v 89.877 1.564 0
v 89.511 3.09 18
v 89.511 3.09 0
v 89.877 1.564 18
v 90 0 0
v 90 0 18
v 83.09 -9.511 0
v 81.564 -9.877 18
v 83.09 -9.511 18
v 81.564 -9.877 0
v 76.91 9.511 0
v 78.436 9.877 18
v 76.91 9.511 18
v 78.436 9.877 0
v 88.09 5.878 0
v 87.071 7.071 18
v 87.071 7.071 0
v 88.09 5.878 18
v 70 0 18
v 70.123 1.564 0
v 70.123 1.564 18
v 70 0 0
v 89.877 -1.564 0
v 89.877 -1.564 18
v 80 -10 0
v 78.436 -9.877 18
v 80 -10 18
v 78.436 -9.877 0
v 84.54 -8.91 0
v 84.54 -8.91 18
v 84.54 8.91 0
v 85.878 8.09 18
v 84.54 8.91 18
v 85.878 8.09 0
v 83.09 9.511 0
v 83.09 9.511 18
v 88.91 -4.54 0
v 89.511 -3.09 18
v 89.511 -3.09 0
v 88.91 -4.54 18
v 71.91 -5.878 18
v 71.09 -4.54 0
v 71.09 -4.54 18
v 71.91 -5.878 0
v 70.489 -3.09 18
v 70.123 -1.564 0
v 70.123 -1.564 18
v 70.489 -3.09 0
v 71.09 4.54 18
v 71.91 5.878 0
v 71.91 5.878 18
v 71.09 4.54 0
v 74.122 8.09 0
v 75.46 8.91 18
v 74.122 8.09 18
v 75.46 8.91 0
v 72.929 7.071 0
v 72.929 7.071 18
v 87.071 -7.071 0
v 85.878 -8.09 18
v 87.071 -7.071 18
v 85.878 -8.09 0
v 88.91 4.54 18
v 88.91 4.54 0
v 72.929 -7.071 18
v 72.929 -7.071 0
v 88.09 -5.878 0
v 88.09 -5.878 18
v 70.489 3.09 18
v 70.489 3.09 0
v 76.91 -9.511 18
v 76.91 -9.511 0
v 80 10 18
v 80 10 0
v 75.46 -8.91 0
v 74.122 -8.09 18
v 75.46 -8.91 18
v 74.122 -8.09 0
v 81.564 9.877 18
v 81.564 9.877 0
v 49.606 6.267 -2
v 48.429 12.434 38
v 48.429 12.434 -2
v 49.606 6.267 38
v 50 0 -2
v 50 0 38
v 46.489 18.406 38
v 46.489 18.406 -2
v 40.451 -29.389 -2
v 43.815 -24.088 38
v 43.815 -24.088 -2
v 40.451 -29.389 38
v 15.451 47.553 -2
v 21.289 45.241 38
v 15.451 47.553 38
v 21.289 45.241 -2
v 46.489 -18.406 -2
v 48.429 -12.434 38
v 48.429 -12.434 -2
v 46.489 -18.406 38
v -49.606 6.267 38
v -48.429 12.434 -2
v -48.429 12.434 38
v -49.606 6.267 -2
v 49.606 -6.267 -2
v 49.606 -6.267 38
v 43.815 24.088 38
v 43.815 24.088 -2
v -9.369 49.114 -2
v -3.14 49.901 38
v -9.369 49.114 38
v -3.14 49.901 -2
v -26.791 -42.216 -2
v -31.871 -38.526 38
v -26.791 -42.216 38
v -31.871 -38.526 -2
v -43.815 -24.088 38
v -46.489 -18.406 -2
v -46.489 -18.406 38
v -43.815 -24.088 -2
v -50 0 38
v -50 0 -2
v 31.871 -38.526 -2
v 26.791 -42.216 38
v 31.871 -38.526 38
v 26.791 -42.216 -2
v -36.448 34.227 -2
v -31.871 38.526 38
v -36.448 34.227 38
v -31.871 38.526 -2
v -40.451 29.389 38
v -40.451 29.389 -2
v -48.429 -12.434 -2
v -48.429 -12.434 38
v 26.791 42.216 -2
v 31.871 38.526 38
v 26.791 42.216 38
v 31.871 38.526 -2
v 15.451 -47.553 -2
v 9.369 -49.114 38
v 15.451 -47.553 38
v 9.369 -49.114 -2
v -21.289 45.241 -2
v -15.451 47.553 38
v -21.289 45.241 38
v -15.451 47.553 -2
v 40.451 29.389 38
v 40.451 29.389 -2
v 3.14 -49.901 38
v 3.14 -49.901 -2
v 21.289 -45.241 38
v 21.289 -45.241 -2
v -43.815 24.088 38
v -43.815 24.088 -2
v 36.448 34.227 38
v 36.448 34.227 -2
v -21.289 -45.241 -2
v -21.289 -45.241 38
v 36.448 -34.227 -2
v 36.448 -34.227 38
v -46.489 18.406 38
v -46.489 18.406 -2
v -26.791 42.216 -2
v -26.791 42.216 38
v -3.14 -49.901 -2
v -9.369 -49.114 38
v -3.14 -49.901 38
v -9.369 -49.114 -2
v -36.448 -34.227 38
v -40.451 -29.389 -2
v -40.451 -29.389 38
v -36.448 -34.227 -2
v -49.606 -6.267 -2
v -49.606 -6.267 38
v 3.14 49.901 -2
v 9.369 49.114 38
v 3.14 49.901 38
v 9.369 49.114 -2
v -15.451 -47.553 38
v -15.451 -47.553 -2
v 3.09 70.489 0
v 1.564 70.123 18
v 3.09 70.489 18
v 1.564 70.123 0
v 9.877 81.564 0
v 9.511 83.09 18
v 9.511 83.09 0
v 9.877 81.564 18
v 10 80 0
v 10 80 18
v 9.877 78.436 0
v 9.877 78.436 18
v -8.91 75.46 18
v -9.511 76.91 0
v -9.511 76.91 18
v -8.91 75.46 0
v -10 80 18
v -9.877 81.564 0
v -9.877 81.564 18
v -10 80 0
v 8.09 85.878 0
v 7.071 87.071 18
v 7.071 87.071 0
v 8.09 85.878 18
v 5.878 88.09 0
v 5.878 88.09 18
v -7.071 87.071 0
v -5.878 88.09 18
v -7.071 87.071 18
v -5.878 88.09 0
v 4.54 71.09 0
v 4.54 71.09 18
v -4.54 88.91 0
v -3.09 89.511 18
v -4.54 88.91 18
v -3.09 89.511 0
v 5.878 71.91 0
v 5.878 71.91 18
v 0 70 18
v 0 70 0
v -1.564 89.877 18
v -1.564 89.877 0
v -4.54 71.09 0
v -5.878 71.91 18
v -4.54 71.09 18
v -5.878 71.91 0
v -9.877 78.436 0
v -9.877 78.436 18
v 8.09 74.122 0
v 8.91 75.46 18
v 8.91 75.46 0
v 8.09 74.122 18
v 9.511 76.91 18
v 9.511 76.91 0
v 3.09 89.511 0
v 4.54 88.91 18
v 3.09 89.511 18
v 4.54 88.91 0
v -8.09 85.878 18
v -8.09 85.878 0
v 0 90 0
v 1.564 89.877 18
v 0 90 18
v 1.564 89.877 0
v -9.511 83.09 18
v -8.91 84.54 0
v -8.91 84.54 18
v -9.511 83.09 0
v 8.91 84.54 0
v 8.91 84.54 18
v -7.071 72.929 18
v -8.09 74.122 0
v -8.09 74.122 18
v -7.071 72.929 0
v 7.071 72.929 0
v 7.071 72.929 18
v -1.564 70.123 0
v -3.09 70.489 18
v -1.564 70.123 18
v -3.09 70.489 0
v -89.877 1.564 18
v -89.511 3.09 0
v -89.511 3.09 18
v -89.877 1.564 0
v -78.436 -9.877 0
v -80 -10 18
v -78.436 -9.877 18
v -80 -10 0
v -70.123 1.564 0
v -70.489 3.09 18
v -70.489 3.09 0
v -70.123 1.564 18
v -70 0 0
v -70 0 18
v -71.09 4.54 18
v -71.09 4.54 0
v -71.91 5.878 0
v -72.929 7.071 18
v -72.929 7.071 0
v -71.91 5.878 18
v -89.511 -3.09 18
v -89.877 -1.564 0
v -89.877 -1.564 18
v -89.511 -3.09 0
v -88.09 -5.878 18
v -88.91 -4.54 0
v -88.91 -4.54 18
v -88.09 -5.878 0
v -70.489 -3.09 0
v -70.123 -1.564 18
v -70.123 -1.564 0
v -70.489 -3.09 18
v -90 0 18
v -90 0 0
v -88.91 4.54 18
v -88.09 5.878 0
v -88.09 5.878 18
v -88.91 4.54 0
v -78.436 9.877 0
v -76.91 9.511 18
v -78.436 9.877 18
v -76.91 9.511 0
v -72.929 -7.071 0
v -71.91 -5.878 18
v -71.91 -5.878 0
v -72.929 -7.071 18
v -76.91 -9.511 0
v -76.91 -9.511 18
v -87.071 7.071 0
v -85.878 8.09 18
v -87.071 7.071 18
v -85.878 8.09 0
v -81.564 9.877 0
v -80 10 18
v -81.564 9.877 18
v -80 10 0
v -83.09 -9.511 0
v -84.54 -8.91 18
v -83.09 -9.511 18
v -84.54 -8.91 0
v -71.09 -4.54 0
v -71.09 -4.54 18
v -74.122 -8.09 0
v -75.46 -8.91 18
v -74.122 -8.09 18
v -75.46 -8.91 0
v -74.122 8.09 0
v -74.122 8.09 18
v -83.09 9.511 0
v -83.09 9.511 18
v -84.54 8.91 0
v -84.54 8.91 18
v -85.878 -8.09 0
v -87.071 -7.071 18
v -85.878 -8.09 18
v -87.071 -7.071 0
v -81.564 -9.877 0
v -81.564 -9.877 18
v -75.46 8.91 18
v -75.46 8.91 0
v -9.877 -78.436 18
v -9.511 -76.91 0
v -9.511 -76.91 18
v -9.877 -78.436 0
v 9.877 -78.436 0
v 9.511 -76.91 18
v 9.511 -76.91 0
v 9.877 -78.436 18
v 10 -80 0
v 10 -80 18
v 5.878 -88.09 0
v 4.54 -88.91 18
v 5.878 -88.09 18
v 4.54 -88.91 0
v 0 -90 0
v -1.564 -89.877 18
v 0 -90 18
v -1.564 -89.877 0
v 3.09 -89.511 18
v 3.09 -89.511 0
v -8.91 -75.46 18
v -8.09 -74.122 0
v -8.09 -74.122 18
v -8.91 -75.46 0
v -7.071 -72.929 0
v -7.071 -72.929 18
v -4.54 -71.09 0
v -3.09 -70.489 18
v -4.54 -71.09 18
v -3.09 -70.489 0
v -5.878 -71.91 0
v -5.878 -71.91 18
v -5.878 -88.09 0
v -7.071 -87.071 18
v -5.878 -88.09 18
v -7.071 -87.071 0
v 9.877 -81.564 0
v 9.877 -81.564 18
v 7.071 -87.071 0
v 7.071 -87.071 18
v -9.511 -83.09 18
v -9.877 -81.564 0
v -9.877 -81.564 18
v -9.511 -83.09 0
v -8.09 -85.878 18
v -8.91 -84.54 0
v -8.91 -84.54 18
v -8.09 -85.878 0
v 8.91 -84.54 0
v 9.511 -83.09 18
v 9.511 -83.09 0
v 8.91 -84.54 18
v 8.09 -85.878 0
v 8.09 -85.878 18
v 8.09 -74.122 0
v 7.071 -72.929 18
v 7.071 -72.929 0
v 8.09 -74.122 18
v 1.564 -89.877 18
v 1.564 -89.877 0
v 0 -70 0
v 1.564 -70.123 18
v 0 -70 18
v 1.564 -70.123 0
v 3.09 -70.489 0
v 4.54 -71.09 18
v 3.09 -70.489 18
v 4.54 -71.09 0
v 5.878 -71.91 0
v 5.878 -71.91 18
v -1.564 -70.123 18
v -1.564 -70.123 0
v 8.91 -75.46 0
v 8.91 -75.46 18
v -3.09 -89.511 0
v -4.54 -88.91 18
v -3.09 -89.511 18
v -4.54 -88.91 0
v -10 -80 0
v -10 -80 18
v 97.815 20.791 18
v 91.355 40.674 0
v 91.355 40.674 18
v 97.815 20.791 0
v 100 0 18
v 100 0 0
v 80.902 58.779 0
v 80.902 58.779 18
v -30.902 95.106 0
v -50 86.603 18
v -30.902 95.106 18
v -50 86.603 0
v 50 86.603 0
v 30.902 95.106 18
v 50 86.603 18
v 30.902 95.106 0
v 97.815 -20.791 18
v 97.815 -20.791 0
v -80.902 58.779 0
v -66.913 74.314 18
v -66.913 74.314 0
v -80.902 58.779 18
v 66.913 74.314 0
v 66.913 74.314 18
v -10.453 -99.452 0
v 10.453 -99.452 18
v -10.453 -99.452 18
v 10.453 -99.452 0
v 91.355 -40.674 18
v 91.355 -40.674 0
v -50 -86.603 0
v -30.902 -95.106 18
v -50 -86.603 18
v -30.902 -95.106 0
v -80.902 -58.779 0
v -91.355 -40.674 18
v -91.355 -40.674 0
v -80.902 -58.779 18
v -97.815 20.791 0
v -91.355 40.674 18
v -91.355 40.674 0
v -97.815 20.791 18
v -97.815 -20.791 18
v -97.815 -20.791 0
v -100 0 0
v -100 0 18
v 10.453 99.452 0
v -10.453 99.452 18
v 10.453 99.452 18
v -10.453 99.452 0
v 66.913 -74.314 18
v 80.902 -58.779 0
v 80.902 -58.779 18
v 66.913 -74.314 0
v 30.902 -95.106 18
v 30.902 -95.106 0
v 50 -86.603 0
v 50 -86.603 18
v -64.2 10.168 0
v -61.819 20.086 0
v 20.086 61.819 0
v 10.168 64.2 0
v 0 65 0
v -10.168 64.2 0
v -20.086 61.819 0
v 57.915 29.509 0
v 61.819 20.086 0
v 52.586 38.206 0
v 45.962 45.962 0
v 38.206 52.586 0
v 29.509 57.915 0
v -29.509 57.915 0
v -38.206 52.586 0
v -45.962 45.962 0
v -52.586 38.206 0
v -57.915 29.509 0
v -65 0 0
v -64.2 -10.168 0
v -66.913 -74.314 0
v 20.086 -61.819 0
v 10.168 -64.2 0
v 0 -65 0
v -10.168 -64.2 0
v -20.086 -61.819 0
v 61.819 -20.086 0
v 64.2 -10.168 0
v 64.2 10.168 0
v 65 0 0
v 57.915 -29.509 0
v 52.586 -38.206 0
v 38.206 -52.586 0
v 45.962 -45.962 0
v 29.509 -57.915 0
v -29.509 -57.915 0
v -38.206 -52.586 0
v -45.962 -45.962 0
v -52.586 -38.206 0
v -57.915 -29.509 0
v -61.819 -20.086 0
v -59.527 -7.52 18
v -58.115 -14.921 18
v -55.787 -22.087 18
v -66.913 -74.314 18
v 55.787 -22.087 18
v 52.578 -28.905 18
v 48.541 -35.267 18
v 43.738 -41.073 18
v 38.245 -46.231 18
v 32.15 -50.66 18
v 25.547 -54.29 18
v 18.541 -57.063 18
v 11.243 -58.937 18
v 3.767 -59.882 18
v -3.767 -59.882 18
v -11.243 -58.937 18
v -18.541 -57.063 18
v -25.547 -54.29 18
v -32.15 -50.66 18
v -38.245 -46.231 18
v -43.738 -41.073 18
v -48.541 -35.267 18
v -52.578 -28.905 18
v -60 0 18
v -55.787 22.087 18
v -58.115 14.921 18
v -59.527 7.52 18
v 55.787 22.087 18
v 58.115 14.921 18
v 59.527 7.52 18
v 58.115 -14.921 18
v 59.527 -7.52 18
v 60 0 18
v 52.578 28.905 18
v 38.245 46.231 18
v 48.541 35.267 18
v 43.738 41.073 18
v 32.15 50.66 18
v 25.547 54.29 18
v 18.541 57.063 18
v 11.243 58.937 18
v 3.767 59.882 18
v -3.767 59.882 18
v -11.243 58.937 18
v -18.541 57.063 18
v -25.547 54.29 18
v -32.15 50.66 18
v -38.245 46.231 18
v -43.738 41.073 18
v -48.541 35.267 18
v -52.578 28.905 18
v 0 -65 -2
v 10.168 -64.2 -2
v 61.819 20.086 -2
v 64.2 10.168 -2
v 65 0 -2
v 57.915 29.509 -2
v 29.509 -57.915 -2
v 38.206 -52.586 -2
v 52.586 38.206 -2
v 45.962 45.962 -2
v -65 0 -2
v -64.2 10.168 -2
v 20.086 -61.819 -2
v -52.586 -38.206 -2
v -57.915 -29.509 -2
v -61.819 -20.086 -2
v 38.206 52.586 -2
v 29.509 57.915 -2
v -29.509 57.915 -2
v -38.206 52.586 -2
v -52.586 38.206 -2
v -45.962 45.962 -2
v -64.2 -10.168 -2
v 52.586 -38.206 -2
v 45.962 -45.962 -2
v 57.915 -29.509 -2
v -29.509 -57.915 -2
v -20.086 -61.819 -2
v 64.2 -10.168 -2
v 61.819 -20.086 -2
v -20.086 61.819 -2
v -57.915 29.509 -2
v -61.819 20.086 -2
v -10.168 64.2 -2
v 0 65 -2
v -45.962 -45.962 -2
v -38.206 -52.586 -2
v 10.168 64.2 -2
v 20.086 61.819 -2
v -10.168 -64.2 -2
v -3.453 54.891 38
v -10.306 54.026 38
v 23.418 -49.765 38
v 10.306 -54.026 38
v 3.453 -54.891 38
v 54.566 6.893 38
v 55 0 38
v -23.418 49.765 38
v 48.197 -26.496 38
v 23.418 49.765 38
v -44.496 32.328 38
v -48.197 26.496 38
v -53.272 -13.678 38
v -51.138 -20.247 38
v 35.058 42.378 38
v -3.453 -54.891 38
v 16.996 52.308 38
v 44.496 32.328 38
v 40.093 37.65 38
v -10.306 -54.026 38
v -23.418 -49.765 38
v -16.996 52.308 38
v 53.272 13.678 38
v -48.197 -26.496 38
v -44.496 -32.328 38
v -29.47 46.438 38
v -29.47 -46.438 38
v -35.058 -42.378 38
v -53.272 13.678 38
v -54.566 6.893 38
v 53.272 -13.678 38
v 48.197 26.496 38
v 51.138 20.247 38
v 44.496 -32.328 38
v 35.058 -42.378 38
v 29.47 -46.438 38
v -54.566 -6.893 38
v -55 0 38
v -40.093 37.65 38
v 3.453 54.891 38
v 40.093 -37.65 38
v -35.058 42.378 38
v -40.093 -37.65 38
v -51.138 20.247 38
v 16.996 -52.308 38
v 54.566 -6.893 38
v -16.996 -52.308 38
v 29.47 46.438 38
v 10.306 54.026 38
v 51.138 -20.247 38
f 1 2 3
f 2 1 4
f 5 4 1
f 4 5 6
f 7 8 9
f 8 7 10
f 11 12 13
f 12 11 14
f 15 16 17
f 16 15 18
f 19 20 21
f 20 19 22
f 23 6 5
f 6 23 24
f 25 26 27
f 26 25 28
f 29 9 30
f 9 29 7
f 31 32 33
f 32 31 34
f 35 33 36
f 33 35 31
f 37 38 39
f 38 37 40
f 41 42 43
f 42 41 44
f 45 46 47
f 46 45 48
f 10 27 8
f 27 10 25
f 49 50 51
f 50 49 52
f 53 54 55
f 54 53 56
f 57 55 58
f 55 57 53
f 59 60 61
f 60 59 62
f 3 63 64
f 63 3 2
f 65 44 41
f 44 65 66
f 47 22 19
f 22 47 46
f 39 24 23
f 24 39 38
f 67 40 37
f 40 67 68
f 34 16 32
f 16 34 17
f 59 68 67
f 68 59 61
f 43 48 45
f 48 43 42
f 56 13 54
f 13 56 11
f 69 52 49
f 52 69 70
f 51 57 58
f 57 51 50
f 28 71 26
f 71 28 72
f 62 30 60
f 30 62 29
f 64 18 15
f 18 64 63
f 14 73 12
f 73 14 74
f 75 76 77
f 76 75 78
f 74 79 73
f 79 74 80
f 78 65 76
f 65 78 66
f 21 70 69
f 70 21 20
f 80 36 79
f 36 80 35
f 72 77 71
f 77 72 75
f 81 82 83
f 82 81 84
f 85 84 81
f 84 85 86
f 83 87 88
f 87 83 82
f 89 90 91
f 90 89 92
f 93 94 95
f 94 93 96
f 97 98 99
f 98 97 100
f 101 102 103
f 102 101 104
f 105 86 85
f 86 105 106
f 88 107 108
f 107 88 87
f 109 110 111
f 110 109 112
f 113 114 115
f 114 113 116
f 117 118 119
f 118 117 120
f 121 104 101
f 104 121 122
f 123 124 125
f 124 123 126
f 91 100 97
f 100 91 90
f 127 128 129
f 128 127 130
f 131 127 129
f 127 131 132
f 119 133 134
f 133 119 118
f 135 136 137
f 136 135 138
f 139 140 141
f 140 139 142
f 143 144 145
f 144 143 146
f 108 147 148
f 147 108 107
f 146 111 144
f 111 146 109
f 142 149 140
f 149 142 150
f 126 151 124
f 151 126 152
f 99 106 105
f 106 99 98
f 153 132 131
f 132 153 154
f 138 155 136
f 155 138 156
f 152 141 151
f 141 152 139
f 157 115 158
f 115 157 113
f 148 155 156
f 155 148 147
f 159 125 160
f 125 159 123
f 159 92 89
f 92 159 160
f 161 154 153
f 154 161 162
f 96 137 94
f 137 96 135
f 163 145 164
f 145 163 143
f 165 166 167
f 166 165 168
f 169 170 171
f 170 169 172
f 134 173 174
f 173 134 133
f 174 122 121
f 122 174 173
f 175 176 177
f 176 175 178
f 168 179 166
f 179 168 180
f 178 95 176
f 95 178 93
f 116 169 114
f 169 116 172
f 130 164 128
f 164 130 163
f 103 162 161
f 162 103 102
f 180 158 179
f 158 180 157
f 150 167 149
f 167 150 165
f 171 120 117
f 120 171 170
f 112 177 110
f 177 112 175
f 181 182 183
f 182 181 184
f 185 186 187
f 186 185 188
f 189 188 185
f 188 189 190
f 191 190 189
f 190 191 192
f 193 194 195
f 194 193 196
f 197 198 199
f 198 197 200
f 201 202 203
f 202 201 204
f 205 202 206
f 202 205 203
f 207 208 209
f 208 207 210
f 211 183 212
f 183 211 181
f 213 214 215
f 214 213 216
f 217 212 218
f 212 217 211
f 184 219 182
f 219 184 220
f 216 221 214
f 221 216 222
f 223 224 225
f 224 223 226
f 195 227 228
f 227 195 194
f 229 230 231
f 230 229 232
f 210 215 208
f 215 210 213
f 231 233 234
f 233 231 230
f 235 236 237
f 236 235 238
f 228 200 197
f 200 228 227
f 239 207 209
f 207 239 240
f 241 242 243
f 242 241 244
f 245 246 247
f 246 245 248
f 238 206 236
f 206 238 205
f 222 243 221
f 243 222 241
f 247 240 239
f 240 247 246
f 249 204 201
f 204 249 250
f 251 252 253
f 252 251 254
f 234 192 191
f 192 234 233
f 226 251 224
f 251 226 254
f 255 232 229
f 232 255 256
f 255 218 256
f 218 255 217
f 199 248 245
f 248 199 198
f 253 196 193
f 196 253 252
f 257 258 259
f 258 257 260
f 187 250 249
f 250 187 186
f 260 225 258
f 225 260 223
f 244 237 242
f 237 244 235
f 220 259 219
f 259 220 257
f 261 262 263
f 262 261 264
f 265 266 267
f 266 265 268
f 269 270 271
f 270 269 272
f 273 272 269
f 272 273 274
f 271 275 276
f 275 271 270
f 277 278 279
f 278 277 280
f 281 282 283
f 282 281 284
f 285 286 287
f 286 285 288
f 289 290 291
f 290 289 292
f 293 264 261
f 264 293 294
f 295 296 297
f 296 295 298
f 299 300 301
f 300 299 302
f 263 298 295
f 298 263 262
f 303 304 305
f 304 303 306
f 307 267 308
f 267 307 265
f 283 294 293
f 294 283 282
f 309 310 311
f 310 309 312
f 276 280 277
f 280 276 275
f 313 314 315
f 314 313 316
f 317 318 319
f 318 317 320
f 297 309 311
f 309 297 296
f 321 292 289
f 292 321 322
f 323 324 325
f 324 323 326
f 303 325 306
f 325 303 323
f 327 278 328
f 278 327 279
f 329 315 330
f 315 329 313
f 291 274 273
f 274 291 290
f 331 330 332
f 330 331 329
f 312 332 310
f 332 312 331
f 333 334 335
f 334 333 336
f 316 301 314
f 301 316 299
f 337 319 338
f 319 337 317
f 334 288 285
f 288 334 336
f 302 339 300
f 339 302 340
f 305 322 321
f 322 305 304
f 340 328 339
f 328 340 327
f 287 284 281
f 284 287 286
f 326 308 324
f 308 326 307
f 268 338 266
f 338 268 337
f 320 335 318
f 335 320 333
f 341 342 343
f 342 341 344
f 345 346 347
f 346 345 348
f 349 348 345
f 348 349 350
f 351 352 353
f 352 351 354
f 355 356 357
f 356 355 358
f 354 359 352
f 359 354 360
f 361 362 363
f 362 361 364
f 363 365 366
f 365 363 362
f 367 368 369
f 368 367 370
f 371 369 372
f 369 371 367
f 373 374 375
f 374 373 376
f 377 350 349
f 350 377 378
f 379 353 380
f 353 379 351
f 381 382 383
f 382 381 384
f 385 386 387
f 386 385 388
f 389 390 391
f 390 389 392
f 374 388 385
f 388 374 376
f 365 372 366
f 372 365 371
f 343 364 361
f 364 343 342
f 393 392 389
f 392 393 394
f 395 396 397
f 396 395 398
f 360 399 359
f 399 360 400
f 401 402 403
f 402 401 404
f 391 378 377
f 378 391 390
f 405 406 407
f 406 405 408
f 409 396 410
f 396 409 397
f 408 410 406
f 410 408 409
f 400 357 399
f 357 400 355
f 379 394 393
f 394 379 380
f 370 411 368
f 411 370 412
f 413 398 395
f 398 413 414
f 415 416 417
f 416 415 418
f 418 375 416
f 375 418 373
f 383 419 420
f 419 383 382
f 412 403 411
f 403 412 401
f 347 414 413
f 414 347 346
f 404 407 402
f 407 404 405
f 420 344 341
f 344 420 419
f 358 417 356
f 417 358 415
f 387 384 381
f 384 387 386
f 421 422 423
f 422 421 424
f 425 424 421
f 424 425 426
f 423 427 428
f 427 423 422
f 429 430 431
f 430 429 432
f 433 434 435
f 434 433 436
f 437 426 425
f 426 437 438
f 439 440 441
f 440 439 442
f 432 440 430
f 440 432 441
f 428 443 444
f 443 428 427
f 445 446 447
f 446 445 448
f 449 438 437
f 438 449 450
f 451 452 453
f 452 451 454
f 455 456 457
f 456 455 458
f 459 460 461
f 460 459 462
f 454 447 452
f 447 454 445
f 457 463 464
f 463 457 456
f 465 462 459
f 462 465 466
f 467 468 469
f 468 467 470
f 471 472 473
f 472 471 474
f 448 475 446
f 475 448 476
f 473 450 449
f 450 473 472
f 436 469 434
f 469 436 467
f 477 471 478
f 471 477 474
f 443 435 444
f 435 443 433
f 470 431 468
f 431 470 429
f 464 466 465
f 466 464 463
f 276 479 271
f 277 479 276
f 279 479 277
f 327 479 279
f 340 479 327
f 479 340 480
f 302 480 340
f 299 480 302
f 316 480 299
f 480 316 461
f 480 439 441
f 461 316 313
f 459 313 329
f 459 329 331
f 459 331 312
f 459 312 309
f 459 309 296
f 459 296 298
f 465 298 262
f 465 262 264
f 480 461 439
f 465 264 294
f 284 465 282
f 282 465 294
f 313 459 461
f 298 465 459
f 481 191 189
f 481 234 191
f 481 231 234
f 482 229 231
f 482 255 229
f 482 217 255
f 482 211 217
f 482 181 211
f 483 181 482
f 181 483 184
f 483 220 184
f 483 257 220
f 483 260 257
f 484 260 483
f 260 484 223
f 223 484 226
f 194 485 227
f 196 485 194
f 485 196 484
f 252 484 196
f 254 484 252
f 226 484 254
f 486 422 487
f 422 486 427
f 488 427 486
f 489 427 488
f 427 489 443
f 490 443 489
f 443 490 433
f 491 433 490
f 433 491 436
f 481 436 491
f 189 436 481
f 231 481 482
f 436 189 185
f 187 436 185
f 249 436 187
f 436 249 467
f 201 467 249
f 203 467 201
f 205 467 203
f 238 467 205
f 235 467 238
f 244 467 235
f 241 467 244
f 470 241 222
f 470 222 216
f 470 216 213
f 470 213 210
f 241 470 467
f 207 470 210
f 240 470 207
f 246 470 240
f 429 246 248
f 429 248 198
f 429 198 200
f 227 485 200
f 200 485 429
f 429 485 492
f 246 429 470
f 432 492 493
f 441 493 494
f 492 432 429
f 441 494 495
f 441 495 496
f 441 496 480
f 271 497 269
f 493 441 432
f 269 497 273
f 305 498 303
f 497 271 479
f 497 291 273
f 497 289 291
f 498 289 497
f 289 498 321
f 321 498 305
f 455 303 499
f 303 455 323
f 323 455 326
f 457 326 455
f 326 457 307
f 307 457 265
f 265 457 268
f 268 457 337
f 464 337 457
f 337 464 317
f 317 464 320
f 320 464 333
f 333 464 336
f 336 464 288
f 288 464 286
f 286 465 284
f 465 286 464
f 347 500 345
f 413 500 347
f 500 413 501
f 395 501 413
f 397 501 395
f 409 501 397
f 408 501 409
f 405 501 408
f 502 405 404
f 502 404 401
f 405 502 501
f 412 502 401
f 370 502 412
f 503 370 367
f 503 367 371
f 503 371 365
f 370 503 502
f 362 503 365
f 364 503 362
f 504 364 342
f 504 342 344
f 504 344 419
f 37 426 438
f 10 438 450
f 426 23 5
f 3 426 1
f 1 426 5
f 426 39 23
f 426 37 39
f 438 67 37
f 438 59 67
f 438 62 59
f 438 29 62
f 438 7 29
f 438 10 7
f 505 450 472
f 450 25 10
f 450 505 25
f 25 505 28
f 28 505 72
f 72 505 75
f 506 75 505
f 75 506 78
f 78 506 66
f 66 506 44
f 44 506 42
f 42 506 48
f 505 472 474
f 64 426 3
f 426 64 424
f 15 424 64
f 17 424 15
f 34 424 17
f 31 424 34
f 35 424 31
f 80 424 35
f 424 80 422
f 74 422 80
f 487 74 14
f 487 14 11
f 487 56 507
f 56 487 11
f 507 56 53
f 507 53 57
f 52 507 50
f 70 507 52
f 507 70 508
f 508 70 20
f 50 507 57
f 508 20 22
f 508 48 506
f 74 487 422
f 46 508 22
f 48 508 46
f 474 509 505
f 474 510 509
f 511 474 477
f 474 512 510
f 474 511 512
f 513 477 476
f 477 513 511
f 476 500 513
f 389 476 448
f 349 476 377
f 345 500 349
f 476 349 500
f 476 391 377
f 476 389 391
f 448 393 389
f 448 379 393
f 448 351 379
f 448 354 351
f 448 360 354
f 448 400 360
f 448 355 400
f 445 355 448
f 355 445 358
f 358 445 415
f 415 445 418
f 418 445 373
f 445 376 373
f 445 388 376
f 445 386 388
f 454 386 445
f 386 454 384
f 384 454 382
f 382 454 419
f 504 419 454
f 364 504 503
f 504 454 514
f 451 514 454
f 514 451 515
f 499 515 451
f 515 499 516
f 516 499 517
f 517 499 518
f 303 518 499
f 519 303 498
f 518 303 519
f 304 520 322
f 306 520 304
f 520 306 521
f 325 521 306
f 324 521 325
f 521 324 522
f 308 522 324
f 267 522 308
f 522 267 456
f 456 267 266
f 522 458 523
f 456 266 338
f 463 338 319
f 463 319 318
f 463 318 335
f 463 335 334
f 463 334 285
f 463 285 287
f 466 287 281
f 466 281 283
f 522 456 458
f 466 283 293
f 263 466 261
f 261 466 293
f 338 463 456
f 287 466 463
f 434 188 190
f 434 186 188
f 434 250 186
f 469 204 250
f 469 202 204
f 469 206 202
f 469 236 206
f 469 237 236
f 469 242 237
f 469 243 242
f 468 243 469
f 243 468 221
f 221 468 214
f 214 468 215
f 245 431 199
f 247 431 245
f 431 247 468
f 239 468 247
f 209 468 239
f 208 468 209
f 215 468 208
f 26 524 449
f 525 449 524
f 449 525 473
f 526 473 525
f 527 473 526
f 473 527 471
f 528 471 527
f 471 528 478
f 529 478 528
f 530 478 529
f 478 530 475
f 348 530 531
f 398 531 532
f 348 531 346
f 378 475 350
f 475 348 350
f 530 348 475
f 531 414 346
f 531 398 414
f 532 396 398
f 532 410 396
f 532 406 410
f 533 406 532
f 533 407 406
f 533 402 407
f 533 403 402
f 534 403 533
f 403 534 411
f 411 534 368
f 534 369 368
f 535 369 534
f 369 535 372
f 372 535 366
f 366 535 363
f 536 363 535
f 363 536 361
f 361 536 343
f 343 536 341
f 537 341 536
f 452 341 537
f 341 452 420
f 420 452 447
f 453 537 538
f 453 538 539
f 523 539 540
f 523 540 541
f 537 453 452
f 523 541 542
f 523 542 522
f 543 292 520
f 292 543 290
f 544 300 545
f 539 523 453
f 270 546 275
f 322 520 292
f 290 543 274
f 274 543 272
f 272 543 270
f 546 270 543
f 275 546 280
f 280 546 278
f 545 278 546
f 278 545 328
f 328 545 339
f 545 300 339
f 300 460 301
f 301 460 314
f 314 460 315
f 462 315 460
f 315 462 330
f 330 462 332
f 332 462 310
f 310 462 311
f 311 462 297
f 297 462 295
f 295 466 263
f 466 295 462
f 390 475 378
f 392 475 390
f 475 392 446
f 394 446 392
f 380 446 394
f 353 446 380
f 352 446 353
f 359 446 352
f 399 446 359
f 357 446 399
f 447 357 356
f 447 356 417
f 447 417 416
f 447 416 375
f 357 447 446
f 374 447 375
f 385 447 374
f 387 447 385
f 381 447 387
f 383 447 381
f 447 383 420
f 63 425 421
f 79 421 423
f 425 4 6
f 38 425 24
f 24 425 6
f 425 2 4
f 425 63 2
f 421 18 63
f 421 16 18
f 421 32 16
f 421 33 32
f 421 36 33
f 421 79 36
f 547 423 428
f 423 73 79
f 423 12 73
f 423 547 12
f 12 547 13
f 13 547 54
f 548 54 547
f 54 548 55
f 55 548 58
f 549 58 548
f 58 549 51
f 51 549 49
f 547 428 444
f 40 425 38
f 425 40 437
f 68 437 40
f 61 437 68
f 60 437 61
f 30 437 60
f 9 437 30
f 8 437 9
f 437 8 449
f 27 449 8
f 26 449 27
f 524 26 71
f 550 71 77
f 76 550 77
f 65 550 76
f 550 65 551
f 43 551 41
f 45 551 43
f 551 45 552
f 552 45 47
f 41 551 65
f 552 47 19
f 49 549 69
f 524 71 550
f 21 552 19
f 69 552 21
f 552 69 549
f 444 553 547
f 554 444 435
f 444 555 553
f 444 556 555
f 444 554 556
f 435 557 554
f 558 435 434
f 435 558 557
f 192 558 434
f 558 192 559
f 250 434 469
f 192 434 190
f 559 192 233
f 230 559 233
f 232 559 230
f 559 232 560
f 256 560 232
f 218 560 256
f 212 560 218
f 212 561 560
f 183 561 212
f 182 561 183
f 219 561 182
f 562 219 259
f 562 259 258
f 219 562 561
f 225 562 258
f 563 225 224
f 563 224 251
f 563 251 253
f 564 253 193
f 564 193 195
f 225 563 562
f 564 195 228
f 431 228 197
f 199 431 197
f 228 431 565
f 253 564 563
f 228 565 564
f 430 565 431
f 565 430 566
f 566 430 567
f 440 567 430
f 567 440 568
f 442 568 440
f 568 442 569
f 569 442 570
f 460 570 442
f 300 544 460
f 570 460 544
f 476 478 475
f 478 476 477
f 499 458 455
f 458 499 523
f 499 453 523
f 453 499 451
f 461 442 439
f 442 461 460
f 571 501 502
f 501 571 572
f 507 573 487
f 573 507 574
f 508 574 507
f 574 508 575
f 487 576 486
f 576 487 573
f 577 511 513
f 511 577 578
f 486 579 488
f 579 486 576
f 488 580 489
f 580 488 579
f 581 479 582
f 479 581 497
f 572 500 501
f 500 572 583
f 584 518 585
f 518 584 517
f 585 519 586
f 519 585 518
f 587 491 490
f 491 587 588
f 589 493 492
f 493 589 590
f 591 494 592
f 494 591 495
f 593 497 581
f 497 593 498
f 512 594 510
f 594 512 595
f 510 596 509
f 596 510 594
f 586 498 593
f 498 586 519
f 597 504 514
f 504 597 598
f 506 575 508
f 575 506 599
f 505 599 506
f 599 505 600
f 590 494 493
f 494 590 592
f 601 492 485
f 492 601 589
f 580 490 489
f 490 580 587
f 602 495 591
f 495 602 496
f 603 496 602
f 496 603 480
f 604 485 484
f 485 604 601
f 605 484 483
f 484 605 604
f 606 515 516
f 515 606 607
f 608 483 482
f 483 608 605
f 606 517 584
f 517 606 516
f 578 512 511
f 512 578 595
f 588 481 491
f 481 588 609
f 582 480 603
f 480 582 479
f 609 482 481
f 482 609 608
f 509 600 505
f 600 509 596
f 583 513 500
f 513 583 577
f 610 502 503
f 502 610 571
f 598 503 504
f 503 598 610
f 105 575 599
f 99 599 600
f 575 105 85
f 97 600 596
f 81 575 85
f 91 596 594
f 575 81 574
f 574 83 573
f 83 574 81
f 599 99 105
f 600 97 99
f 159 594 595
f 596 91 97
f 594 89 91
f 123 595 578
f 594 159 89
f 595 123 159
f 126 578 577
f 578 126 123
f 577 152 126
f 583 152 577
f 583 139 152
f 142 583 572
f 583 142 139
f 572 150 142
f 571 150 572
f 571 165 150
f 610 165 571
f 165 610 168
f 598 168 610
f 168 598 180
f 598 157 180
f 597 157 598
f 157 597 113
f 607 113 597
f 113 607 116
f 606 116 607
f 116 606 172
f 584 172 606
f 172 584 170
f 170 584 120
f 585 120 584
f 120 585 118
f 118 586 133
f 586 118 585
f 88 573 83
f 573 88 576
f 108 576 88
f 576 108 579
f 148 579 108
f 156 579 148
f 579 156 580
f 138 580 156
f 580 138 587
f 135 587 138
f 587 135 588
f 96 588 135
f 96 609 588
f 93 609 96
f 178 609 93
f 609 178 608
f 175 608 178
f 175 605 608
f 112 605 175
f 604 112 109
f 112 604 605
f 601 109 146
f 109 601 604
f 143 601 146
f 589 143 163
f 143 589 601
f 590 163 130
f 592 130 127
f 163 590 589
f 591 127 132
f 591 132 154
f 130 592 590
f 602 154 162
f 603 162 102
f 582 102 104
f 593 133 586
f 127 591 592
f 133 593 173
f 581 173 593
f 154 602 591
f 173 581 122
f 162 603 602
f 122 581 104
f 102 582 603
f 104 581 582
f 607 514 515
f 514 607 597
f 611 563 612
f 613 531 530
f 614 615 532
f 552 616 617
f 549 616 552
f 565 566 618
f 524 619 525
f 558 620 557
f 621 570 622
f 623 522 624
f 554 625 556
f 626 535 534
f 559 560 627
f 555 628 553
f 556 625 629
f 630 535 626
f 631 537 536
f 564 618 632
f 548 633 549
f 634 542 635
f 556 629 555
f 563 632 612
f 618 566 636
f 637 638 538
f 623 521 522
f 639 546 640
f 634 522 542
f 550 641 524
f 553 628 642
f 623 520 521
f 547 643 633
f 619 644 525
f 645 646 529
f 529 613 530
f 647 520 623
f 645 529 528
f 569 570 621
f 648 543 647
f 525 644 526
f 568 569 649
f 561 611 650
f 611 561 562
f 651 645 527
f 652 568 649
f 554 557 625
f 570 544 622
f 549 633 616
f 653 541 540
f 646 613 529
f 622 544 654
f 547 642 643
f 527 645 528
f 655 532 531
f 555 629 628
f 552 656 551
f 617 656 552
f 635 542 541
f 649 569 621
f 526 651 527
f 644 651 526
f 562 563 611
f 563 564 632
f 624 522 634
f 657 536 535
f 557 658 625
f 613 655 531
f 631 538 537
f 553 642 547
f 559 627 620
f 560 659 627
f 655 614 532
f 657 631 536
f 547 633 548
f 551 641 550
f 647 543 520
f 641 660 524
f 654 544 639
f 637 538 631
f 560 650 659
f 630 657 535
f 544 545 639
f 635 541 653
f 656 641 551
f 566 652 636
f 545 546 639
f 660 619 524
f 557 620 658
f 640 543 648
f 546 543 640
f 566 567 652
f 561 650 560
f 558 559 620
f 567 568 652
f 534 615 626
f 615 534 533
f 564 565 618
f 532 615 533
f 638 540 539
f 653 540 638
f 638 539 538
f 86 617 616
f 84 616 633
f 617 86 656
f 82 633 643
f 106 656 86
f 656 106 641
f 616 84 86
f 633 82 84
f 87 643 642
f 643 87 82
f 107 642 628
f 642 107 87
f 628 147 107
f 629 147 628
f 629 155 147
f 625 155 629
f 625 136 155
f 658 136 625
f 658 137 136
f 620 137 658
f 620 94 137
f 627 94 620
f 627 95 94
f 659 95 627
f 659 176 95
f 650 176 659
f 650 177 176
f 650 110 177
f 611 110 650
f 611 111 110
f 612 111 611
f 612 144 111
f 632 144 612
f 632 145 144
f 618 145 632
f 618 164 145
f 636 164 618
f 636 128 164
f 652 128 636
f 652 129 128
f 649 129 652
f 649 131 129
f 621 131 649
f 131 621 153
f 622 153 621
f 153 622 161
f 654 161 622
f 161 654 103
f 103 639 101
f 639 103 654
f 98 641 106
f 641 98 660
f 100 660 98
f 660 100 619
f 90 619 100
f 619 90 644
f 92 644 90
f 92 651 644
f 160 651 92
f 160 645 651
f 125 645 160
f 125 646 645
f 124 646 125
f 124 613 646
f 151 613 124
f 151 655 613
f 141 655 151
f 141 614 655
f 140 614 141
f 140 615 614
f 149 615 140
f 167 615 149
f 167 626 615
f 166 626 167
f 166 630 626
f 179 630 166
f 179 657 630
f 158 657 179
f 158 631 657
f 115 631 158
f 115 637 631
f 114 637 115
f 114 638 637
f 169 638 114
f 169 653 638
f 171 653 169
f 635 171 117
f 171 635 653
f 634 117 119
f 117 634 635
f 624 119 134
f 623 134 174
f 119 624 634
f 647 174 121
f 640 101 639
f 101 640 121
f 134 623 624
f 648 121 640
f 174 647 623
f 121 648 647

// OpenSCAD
module Flange_Weld_Neck(){

Flange_Height = 18;
Total_Height = 38;

Step_Height = 2;
Hole_Diameter = 10; 
Hole_Center_Distance = 100;

color("#c0c6c7"){
    difference(){
  
        union(){
            translate([0,0,- Step_Height]){ 
            cylinder(Step_Height,65,65,$fn=40);
            }

            difference(){
            cylinder(Flange_Height,100,100,$fn=30);
            
            r = 80;
             
            // Flange Holes
            for (i=[0:90:359]) {
                translate([r*cos(i),r*sin(i),-1])
                cylinder(Flange_Height+2,10,10,$fn=40);
             
                translate([0,0,-1]) 
                cylinder(12,50,50,$fn=50);  
                }
             }
       
       translate([0,0,Flange_Height]) 
        cylinder(Total_Height - Flange_Height,60,55,$fn=50);    
        }
     
        translate([0,0,-10]) 
        cylinder(100,50,50,$fn=50);
    }
}

}

Flange_Weld_Neck();
